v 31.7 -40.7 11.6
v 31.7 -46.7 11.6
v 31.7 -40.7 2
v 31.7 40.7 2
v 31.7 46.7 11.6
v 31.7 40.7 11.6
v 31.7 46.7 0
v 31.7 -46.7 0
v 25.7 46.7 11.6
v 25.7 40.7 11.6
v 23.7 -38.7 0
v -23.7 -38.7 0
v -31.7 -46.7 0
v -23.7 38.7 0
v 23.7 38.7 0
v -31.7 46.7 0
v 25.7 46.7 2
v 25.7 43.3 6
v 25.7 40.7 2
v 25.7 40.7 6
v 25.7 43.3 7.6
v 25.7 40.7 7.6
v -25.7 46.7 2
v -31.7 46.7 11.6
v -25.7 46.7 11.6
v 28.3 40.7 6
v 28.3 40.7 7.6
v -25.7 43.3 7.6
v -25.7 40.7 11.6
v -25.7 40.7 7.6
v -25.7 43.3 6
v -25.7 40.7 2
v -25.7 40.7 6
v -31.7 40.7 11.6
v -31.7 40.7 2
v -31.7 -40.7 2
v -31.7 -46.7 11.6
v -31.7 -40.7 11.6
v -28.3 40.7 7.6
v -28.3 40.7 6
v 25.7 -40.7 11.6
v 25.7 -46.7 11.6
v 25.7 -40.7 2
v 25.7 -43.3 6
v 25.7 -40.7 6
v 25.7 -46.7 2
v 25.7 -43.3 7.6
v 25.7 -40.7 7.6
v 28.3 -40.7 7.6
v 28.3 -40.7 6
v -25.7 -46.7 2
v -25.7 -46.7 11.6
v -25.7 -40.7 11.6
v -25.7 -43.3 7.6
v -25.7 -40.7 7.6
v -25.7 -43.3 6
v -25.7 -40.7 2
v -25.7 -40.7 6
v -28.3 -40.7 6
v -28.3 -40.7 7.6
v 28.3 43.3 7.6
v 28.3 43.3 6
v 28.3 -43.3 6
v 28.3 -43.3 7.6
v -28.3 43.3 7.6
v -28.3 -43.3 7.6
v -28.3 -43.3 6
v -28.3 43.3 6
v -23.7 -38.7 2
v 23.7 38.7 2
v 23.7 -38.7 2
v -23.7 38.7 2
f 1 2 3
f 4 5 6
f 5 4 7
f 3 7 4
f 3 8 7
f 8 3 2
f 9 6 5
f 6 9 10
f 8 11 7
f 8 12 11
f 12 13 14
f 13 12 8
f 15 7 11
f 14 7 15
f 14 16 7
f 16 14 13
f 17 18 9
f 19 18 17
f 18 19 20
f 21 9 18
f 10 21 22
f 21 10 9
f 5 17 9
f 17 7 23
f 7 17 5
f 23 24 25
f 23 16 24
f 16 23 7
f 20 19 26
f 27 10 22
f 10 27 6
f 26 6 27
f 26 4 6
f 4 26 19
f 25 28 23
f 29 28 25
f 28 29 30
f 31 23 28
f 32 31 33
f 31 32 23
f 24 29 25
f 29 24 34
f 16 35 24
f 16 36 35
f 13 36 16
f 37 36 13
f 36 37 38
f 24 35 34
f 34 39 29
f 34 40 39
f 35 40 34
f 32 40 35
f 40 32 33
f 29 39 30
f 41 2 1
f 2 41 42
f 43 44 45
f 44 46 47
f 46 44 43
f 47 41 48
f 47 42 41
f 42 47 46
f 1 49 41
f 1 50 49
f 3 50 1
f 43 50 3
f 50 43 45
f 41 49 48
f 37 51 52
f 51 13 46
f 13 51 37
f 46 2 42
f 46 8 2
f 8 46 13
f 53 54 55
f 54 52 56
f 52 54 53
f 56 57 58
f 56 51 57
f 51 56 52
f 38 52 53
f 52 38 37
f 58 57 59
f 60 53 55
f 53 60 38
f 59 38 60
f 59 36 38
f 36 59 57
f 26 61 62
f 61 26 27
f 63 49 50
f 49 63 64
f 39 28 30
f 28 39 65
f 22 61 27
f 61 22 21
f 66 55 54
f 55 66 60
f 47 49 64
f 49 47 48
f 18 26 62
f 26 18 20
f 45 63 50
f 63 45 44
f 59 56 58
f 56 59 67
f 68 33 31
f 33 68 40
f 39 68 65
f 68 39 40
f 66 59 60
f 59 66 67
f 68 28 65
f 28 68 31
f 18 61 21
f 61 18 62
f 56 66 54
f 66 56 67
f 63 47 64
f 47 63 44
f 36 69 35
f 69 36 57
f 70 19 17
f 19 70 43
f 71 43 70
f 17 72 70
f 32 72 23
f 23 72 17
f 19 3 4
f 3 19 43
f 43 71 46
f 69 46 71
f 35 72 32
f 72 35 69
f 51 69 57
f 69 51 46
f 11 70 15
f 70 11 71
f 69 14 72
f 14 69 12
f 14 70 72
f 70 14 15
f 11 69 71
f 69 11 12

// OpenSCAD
/* A simple frame for PCB's
**----------------------------------------------------------------------------------
** 29-Dec-2012 shaneg
**
** This is a simple holding frame for bare PCB boards. It can be scaled to hold any
** sized board (limited only by your print area).
**--------------------------------------------------------------------------------*/

/* PCB Dimensions
**
** Set the dimensions of your board (in mm). All other measurements are derived from
** these values. The sample values below are for a Raspberry Pi Model B.
*/
PCB_WIDTH     = 56;  // Width of the PCB in mm
PCB_BREADTH   = 86;  // Length of the PCB in mm
PCB_HEIGHT    = 1;   // Height of the board itself
PCB_CLEARANCE = 4;   // Gap between the base of the PCB and the base plate.
PCB_EDGE_CLIP = 2;   // Gap for the clip in the mounts
MOUNT_SIZE    = 6;   // Size of the mounts (they are square)
MOUNT_EXTRA   = 4;   // Extra space above the clip hole
FUDGE_FACTOR  = 0.3; // Extra space when using PCB clip holes

/* PCB Dimensions for a Gumstix Tobi
**   See - https://www.gumstix.com/store/product_info.php?products_id=230
**
PCB_WIDTH     = 40;  // Width of the PCB in mm
PCB_BREADTH   = 105; // Length of the PCB in mm
PCB_HEIGHT    = 1;   // Height of the board itself
PCB_CLEARANCE = 4;   // Gap between the base of the PCB and the base plate.
PCB_EDGE_CLIP = 2;   // Gap for the clip in the mounts
MOUNT_SIZE    = 6;   // Size of the mounts (they are square)
MOUNT_EXTRA   = 4;   // Extra space above the clip hole
FUDGE_FACTOR  = 0.3; // Extra space when using PCB clip holes
*/

/* PCB Dimensions for a Gumstix Chestnut43
**  See - https://www.gumstix.com/store/product_info.php?products_id=237
**
PCB_WIDTH     = 68;  // Width of the PCB in mm
PCB_BREADTH   = 118; // Length of the PCB in mm
PCB_HEIGHT    = 1;   // Height of the board itself
PCB_CLEARANCE = 24;  // Gap between the base of the PCB and the base plate.
PCB_EDGE_CLIP = 2;   // Gap for the clip in the mounts
MOUNT_SIZE    = 6;   // Size of the mounts (they are square)
MOUNT_EXTRA   = 4;   // Extra space above the clip hole
FUDGE_FACTOR  = 0.3; // Extra space when using PCB clip holes
*/

/* PCB Dimensions for the breadboard power supply
**
PCB_WIDTH     = 25;  // Width of the PCB in mm
PCB_BREADTH   = 55;  // Length of the PCB in mm
PCB_HEIGHT    = 1;   // Height of the board itself
PCB_CLEARANCE = 4;   // Gap between the base of the PCB and the base plate.
PCB_EDGE_CLIP = 2;   // Gap for the clip in the mounts
MOUNT_SIZE    = 6;   // Size of the mounts (they are square)
MOUNT_EXTRA   = 4;   // Extra space above the clip hole
FUDGE_FACTOR  = 0.3; // Extra space when using PCB clip holes
*/

/* PCB Dimensions for the breadboard power supply
**
PCB_WIDTH     = 47;  // Width of the PCB in mm
PCB_BREADTH   = 72;  // Length of the PCB in mm
PCB_HEIGHT    = 2;   // Height of the board itself
PCB_CLEARANCE = 4;   // Gap between the base of the PCB and the base plate.
PCB_EDGE_CLIP = 3;   // Gap for the clip in the mounts
MOUNT_SIZE    = 6;   // Size of the mounts (they are square)
MOUNT_EXTRA   = 4;   // Extra space above the clip hole
FUDGE_FACTOR  = 0.3; // Extra space when using PCB clip holes
*/

/* PCB Dimensions for AVR programmer adaptor
**
PCB_WIDTH     = 66;  // Width of the PCB in mm
PCB_BREADTH   = 65;  // Length of the PCB in mm
PCB_HEIGHT    = 1;   // Height of the board itself
PCB_CLEARANCE = 4;   // Gap between the base of the PCB and the base plate.
PCB_EDGE_CLIP = 2;   // Gap for the clip in the mounts
MOUNT_SIZE    = 6;   // Size of the mounts (they are square)
MOUNT_EXTRA   = 4;   // Extra space above the clip hole
FUDGE_FACTOR  = 0.3; // Extra space when using PCB clip holes
*/

/* The base plate size
**
** Specifies the size of the base plate. Most of these are calculated from the values
** given above. The things you might need to change are the 'BASE_PLATE_HEIGHT' value
** which specifies the height of the base plate itself and the 'BASE_PLATE_EXTRA' value
** which specifies the additional space to add to the base plate rectangle if you
** need to add mounting holes etc.
*/
BASE_PLATE_WIDTH   = PCB_WIDTH + (2 * (MOUNT_SIZE - FUDGE_FACTOR - PCB_EDGE_CLIP));
BASE_PLATE_BREADTH = PCB_BREADTH + (2 * (MOUNT_SIZE - FUDGE_FACTOR - PCB_EDGE_CLIP));
BASE_PLATE_HEIGHT  = 2;
BASE_PLATE_EXTRA   = 2;

/* Size of the base plate hole.
**
** This is the hole cut into the base plate to minimise the amount of plastic that
** you need. The values here are calculated from the settings above. If you want a
** solid base plate set both of these to zero.
*/
BASE_PLATE_HOLE_WIDTH   = BASE_PLATE_WIDTH - (2 * MOUNT_SIZE) - (2 * BASE_PLATE_EXTRA);
BASE_PLATE_HOLE_BREADTH = BASE_PLATE_BREADTH - (2 * MOUNT_SIZE) - (2 * BASE_PLATE_EXTRA);

/*----------------------------------------------------------------------------------
** Customisation modules
**--------------------------------------------------------------------------------*/

/* Modify the base plate
**
** The objects defined here will be subtracted from the base plate. You can
** use this to define mounting holes, etc. The example code given here creates
** holes for M3 mounting bolts - if you want to do this you should increase
** the value of 'BASE_PLATE_EXTRA' to 5 or more.
*/
module modify_baseplate() {
/* Sample code to create M3 mounting holes
**
** See notes above for more details.
**
  mid_width = (BASE_PLATE_HOLE_WIDTH / 2) + ((BASE_PLATE_WIDTH - BASE_PLATE_HOLE_WIDTH) / 4);
  mid_breadth = (BASE_PLATE_HOLE_BREADTH / 2) + ((BASE_PLATE_BREADTH - BASE_PLATE_HOLE_BREADTH) / 4);
  // Generate mounting holes for M3 bolts on each edge of the frame
  translate(v = [ 0, mid_breadth, 0 ]) {
    cylinder(r = 1.5 + (2 * FUDGE_FACTOR), h = 3 * BASE_PLATE_HEIGHT, center = true, $fs = 0.3);
    }
  translate(v = [ 0, -mid_breadth, 0 ]) {
    cylinder(r = 1.5 + (2 * FUDGE_FACTOR), h = 3 * BASE_PLATE_HEIGHT, center = true, $fs = 0.3);
    }
  translate(v = [ mid_width, 0, 0 ]) {
    cylinder(r = 1.5 + (2 * FUDGE_FACTOR), h = 3 * BASE_PLATE_HEIGHT, center = true, $fs = 0.3);
    }
  translate(v = [ -mid_width, 0, 0 ]) {
    cylinder(r = 1.5 + (2 * FUDGE_FACTOR), h = 3 * BASE_PLATE_HEIGHT, center = true, $fs = 0.3);
    }
*/
  }

/*----------------------------------------------------------------------------------
** Generate the components
**--------------------------------------------------------------------------------*/

/** Generate a single mount point
 */
module mount_point() {
  mp_height = BASE_PLATE_HEIGHT + PCB_CLEARANCE + PCB_HEIGHT + (FUDGE_FACTOR * 2) + MOUNT_EXTRA;
  translate(v = [ 0, 0, mp_height / 2 ]) {
    cube(size = [ MOUNT_SIZE, MOUNT_SIZE, mp_height ], center = true);
    }
  }

/** Generate all four mount points
 */
module mount_points() {
  clip_adjust = MOUNT_SIZE / 2;
  notch_width = PCB_WIDTH + (2 * FUDGE_FACTOR);
  notch_breadth = PCB_BREADTH + (2 * FUDGE_FACTOR);
  notch_height = PCB_HEIGHT + (2 * FUDGE_FACTOR);
  difference() {
    union() {
      translate(v = [ (BASE_PLATE_WIDTH / 2 - clip_adjust), (BASE_PLATE_BREADTH / 2 - clip_adjust), 0 ]) {
        mount_point();
        }
      translate(v = [ -(BASE_PLATE_WIDTH / 2 - clip_adjust), (BASE_PLATE_BREADTH / 2 - clip_adjust), 0 ]) {
        mount_point();
        }
      translate(v = [ (BASE_PLATE_WIDTH / 2 - clip_adjust), -(BASE_PLATE_BREADTH / 2 - clip_adjust), 0 ]) {
        mount_point();
        }
      translate(v = [ -(BASE_PLATE_WIDTH / 2 - clip_adjust), -(BASE_PLATE_BREADTH / 2 - clip_adjust), 0 ]) {
        mount_point();
        }
      }
    // Cut the notches
    translate(v = [ 0, 0, (notch_height / 2) + BASE_PLATE_HEIGHT + PCB_CLEARANCE ]) {
      cube(size = [ notch_width, notch_breadth, notch_height ], center = true);
      }
    }
  }

/** Generate the base plate
 *
 */
module baseplate() {
  translate(v = [ 0, 0, BASE_PLATE_HEIGHT / 2]) {
    difference() {
      cube(size = [ BASE_PLATE_WIDTH, BASE_PLATE_BREADTH, BASE_PLATE_HEIGHT ], center = true);
      cube(size = [ BASE_PLATE_HOLE_WIDTH, BASE_PLATE_HOLE_BREADTH, 2 * BASE_PLATE_HEIGHT ], center = true);
      }
    }
  }

/*----------------------------------------------------------------------------------
** Main object
**--------------------------------------------------------------------------------*/

union() {
  mount_points();
  difference() {
    baseplate();
    modify_baseplate();
    }
  }
